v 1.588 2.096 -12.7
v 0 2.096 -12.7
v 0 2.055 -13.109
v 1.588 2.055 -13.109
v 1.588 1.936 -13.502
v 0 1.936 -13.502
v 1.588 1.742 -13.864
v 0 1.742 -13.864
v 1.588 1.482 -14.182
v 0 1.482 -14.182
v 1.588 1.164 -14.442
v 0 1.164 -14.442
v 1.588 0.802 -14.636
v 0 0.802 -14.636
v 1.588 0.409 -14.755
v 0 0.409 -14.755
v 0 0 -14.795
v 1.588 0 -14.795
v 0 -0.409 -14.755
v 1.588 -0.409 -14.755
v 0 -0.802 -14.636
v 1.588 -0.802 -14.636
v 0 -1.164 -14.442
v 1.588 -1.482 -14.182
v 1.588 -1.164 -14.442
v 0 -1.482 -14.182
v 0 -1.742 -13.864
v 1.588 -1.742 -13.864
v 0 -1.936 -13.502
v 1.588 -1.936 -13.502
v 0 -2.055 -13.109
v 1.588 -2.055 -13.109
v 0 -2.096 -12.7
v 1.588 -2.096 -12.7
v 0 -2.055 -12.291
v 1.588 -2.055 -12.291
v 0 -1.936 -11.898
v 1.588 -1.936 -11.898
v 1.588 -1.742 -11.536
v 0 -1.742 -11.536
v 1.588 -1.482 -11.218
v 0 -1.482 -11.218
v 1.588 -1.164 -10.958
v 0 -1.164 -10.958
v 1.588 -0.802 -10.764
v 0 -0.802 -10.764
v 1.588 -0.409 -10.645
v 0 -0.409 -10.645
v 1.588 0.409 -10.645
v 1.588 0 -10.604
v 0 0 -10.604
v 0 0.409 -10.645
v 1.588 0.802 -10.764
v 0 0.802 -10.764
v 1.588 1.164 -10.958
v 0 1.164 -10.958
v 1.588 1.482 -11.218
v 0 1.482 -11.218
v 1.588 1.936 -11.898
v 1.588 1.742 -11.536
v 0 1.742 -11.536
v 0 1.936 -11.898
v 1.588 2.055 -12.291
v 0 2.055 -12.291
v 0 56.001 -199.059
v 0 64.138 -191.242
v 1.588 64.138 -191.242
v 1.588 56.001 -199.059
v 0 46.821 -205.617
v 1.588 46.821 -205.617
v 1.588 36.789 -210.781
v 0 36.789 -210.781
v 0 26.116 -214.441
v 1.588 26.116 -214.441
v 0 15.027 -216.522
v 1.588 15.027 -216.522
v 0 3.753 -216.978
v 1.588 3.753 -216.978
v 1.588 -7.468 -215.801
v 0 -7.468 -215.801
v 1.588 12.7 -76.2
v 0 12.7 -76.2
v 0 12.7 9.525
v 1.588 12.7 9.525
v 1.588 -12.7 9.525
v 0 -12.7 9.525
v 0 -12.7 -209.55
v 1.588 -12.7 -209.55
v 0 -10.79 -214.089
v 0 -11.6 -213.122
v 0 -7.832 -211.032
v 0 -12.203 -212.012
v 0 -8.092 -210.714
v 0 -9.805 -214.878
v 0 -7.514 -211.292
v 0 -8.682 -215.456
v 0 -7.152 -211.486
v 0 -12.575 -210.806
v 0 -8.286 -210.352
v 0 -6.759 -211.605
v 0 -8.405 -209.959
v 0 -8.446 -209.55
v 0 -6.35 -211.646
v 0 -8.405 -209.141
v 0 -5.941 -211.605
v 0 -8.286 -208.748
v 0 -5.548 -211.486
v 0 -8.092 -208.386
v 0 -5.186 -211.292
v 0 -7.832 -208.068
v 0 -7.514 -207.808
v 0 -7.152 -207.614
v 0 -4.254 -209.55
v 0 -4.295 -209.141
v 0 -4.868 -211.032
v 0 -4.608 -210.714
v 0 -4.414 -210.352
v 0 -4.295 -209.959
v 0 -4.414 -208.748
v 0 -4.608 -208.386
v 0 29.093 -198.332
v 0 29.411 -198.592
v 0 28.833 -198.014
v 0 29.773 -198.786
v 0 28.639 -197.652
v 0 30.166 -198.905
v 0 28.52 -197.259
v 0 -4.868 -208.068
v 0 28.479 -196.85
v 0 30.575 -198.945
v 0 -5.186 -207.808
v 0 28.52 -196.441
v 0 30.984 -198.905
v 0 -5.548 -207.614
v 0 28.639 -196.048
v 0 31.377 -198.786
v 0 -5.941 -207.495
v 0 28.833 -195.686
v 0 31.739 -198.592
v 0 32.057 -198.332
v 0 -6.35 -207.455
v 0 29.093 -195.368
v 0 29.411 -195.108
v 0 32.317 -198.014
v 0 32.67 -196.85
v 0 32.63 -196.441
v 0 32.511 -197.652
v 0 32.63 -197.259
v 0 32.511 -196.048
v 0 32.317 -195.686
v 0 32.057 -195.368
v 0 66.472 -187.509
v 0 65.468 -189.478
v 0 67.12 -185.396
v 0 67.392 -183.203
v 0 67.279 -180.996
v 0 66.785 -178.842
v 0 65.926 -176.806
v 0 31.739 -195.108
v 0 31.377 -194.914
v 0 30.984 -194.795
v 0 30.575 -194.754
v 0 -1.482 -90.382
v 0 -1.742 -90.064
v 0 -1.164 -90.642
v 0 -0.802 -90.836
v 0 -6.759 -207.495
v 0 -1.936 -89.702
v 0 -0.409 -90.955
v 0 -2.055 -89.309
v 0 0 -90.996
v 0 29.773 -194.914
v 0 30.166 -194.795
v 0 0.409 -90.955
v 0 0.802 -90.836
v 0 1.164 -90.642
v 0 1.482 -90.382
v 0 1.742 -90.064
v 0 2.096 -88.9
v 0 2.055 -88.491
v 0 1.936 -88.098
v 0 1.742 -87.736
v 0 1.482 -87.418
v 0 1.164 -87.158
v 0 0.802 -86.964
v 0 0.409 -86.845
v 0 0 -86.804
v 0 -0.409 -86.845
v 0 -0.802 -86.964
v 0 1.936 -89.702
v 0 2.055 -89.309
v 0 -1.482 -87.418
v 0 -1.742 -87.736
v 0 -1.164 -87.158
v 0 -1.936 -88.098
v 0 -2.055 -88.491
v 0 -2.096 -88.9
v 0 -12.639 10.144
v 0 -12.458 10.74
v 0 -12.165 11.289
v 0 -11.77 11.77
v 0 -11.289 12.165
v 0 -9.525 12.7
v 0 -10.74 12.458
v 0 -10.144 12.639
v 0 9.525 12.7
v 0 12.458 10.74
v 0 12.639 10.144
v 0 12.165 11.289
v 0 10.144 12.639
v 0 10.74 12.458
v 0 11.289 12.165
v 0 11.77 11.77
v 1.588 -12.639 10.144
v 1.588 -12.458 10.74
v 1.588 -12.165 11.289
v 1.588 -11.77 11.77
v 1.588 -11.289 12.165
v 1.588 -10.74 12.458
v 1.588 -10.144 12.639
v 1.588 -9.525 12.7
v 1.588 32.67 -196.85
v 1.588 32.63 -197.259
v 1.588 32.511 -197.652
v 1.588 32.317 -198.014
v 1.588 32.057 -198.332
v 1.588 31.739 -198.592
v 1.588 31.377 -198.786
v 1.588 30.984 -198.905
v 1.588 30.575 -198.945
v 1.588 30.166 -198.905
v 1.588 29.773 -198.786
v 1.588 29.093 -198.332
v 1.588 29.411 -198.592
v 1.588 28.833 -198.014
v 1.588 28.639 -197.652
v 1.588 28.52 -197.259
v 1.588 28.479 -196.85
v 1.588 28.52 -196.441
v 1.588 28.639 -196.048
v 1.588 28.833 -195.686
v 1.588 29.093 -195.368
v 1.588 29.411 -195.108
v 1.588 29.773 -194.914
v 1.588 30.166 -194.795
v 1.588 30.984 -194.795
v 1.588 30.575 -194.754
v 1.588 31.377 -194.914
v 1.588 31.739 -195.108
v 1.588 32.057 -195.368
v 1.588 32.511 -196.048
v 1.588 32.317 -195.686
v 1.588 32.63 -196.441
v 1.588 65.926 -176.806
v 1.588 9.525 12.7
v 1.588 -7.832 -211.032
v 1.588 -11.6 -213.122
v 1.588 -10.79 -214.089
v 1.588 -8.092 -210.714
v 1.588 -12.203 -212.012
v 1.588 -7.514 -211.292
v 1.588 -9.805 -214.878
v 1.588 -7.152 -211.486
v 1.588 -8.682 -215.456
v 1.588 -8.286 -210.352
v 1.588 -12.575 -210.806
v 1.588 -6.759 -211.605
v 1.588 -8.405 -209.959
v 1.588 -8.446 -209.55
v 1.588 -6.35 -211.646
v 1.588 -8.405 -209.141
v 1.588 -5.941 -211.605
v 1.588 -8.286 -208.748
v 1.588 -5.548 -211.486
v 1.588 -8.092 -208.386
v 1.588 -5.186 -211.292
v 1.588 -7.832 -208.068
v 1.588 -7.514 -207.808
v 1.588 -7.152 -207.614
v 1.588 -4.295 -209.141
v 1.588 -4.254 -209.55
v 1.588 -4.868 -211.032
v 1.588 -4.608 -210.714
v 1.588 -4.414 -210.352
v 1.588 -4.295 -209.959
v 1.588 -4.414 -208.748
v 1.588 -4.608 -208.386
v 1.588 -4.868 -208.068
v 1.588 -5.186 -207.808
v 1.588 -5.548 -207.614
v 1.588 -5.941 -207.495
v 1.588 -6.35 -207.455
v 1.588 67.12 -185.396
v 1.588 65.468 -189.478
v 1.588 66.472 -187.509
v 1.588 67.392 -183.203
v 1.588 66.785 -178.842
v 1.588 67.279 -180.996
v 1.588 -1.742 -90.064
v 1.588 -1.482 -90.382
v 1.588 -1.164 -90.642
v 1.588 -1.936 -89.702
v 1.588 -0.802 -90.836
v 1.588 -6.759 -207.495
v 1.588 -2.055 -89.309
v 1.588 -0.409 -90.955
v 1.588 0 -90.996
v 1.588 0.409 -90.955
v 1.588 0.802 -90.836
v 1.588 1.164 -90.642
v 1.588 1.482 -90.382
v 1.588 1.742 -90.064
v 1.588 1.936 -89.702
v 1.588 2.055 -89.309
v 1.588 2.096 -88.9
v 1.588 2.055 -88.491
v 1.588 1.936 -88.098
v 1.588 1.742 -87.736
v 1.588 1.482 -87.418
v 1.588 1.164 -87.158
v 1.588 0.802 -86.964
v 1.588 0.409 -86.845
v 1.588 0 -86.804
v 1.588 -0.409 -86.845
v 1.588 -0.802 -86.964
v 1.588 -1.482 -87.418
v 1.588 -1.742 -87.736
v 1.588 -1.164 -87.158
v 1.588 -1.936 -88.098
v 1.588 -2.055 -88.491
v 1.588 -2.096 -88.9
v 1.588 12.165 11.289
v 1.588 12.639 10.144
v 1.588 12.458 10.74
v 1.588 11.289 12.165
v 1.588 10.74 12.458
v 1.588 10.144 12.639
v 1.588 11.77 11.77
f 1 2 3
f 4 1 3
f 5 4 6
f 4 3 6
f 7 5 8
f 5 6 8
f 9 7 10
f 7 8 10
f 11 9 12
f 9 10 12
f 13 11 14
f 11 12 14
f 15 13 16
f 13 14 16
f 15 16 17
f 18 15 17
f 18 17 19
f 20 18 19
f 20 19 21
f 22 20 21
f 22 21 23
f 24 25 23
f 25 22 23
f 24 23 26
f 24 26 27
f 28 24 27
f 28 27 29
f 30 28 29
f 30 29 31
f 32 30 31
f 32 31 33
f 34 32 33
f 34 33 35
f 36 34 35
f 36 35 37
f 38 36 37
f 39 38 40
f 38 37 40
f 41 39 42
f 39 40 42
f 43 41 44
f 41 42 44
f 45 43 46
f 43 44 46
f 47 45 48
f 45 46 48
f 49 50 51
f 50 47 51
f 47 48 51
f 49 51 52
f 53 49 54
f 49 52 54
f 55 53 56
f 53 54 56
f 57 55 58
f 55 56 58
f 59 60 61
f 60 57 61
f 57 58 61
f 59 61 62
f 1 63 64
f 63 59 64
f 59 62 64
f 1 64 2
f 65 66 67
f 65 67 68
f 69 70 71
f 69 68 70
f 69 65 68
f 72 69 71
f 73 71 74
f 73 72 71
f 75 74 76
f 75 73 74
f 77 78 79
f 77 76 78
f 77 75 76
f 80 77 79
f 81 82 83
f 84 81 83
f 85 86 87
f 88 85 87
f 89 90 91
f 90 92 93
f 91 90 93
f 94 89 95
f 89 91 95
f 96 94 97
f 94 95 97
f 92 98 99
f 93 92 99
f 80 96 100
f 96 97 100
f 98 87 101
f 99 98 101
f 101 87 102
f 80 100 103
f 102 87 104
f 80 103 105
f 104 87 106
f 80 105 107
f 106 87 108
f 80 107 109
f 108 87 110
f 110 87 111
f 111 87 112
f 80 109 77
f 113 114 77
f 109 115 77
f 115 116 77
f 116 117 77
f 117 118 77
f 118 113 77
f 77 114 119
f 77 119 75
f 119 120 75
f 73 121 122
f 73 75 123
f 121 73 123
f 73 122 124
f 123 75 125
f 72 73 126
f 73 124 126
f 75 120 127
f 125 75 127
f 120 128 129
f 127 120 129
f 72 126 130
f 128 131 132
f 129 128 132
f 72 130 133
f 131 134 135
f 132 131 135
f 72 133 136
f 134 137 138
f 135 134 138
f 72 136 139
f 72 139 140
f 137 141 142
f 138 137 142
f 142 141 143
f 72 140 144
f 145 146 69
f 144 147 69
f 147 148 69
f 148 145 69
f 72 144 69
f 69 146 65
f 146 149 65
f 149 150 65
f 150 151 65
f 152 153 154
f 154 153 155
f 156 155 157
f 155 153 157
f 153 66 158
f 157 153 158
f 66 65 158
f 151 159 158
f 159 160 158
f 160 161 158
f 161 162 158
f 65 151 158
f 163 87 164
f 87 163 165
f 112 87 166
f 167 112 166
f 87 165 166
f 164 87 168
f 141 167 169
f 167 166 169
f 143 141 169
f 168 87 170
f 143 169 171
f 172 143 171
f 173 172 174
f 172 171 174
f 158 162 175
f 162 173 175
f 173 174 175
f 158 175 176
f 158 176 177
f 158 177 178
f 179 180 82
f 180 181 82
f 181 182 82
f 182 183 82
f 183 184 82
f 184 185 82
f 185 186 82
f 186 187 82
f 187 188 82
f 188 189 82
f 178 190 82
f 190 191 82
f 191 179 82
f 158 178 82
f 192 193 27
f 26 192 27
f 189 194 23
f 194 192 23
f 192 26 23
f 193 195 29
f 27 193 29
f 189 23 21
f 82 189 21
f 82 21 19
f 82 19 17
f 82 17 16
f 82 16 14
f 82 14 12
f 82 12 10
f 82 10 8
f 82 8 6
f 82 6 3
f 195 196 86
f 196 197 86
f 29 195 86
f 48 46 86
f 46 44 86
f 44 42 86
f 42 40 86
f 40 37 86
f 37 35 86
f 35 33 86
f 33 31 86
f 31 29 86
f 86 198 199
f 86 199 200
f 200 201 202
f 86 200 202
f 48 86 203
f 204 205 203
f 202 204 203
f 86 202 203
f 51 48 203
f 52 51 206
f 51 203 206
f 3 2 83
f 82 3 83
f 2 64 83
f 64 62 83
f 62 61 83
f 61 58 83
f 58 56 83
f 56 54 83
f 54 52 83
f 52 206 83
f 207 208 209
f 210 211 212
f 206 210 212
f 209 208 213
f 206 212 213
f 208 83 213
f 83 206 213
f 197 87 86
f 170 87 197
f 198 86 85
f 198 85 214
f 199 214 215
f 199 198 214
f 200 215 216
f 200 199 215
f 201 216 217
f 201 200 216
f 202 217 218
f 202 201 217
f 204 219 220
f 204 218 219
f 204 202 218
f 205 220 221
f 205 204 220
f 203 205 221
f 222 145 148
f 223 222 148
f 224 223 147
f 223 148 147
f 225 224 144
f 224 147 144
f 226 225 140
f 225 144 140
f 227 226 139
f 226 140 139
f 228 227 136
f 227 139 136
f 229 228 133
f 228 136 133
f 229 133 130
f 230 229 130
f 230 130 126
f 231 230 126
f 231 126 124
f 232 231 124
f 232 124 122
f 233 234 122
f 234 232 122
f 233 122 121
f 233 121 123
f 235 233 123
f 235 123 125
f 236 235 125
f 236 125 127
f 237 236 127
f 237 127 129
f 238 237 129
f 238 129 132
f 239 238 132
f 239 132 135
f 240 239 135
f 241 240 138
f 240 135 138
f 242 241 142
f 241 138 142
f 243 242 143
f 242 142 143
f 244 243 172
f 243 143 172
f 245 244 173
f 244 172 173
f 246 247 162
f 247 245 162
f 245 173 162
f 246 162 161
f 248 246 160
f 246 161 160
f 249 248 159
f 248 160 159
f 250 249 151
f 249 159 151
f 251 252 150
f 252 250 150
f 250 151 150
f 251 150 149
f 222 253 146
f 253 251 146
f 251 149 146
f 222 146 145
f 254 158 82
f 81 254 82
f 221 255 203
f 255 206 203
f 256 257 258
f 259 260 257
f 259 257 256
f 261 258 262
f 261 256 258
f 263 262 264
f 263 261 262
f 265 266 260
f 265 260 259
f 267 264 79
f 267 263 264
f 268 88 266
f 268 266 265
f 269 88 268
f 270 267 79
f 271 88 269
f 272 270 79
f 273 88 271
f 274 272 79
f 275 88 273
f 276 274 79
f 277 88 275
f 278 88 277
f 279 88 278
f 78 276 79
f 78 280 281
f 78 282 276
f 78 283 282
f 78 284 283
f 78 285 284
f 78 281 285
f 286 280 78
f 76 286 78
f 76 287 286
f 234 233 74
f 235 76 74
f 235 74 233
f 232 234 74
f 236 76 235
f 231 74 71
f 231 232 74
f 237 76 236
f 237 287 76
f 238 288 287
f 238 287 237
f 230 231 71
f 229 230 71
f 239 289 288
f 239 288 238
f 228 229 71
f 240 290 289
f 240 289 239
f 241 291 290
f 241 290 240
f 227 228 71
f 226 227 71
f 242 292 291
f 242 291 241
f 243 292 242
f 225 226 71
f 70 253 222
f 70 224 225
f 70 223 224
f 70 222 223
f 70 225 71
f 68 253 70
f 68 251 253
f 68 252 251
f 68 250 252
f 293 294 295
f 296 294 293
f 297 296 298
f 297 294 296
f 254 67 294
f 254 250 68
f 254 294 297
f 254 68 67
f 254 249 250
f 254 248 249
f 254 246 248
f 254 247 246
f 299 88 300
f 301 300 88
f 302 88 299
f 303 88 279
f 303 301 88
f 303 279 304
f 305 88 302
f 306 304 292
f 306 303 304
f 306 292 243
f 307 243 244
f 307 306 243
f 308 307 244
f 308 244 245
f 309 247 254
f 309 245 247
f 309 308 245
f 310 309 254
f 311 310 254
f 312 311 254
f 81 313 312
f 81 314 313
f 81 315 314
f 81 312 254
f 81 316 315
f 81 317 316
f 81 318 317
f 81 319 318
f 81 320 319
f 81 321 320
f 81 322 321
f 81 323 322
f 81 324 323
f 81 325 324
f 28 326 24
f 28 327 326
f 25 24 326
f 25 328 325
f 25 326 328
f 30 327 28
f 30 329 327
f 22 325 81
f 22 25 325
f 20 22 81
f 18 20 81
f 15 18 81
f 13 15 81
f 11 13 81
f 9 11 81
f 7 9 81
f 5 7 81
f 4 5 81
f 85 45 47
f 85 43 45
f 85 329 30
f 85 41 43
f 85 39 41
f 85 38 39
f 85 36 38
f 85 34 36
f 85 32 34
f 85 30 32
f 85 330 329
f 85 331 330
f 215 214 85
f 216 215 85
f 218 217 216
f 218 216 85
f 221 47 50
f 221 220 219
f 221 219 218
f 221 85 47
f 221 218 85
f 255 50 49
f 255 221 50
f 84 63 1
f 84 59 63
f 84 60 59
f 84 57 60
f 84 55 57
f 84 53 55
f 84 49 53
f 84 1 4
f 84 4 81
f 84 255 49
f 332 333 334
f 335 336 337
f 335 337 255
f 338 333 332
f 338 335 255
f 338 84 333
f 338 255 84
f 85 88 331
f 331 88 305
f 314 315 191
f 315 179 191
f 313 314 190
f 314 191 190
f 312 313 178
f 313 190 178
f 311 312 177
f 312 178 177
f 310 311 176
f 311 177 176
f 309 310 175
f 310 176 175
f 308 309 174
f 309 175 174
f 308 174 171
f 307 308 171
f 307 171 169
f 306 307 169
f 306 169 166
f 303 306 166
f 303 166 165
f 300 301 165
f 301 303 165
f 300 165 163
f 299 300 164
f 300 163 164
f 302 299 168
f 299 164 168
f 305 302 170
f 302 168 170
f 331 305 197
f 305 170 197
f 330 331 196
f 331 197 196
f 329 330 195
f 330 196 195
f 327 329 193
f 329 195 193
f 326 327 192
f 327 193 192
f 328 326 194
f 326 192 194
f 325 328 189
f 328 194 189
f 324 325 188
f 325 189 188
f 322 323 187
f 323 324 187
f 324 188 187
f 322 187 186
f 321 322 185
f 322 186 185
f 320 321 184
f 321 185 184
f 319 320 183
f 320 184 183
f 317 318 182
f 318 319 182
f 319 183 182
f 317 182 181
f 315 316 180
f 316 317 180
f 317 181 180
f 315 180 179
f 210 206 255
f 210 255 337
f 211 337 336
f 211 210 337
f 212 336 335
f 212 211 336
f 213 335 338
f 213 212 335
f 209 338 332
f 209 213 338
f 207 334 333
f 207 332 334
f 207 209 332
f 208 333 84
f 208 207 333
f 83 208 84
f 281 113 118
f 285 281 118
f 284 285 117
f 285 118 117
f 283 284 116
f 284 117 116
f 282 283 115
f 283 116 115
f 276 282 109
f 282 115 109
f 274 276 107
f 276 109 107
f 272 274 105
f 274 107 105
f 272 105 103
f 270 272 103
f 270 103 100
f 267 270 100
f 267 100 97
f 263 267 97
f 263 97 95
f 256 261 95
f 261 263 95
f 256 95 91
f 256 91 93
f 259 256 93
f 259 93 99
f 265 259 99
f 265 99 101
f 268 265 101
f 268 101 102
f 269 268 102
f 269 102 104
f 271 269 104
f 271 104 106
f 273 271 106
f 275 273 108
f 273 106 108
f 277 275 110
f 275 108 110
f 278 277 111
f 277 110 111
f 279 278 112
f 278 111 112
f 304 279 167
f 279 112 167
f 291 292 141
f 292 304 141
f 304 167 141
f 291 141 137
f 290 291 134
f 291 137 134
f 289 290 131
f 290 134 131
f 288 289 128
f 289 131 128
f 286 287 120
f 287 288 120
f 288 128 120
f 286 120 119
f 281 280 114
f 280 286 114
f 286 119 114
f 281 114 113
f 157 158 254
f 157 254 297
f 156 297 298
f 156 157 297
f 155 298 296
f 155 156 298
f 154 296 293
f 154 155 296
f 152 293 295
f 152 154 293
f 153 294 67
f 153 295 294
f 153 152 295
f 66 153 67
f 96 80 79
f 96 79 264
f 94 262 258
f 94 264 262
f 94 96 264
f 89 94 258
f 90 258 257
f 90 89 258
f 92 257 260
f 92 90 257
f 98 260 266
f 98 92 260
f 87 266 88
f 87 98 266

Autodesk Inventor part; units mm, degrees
ref_plane "YZ Plane" through (0, 0, 0) normal (1, 0, 0) x (0, 1, 0)
ref_plane "XZ Plane" through (0, 0, 0) normal (0, 1, 0) x (-1, 0, 0)
ref_plane "XY Plane" through (0, 0, 0) normal (0, 0, 1) x (1, 0, 0)
sketch "main" plane through (0, 0, 0) normal (0, 0, 1) x (1, 0, 0)
  circle A0 centre (-31.9195, -99.4713) radius 2.0955
  arc A1 (-38.2695, -99.4713) -> (-33.0376, -105.722) centre (-31.9195, -99.4713) ccw
  arc A2 (-33.0376, -105.722) -> (38.5686, -81.1636) centre (-19.3218, -29.0418) ccw
  line L0 (40.3562, -66.7269) -> (-12.8695, 33.8787)
  line L1 (-12.8695, 33.8787) -> (-12.8695, 119.6037)
  line L2 (-16.0445, 122.7787) -> (-35.0945, 122.7787)
  line L3 (-38.2695, 119.6037) -> (-38.2695, -99.4713)
  arc A3 (38.5686, -81.1636) -> (40.3562, -66.7269) centre (29.1304, -72.6659) ccw
  circle A4 centre (-25.5695, 21.1787) radius 2.0955
  arc A5 (-12.8695, 119.6037) -> (-16.0445, 122.7787) centre (-16.0445, 119.6037) ccw
  circle A6 centre (5.0055, -86.7713) radius 2.0955
  circle A7 centre (-25.5695, 97.3787) radius 2.0955
  arc A8 (-35.0945, 122.7787) -> (-38.2695, 119.6037) centre (-35.0945, 119.6037) ccw
  point P0 (-9.1863, -18.3686)
  point P1 (44.2418, -74.0713)
  dimension "d0" = 4.191
  dimension "d1" = 12.7
  dimension "d3" = 4.191
  dimension "d4" = 3.175
  dimension "d5" = 4.191
  dimension "d17" = 4.191
  dimension "d18" = 3.175
sketch "Sketch1" plane through (0, 0, 0) normal (1, 0, 0) x (0, 1, 0)
  circle A0 centre (-6.35, -209.55) radius 2.0955
  arc A1 (-12.7, -209.55) -> (-7.4681, -215.8008) centre (-6.35, -209.55) ccw
  arc A2 (-7.4681, -215.8008) -> (64.1381, -191.2423) centre (6.2477, -139.1205) ccw
  line L0 (65.9257, -176.8056) -> (12.7, -76.2)
  line L1 (12.7, -76.2) -> (12.7, 9.525)
  line L2 (9.525, 12.7) -> (-9.525, 12.7)
  line L3 (-12.7, 9.525) -> (-12.7, -209.55)
  arc A3 (64.1381, -191.2423) -> (65.9257, -176.8056) centre (54.7, -182.7446) ccw
  circle A4 centre (0, -88.9) radius 2.0955
  arc A5 (12.7, 9.525) -> (9.525, 12.7) centre (9.525, 9.525) ccw
  circle A6 centre (30.575, -196.85) radius 2.0955
  circle A7 centre (0, -12.7) radius 2.0955
  arc A8 (-9.525, 12.7) -> (-12.7, 9.525) centre (-9.525, 9.525) ccw
  point P0 (0, 0)
extrude "Extrusion1" add sketch "Sketch1" along normal blind 1.5875
equation "\"BendRadius\" = Thickness"
equation "\"BendReliefWidth\" = Thickness"
equation "\"BendReliefDepth\" = 0.5 * Thickness"
equation "\"CornerReliefSize\" = 4 * Thickness"
equation "\"MinimumRemnant\" = 2 * Thickness"
equation "\"TransitionRadius\" = BendRadius"
equation "\"JacobiRadiusSize\" = BendRadius"
equation "\"GapSize\" = Thickness"
equation "\"Thickness\" = 1.5875"
properties part number "gusset_no_motor" material "Acetal Resin, White"
